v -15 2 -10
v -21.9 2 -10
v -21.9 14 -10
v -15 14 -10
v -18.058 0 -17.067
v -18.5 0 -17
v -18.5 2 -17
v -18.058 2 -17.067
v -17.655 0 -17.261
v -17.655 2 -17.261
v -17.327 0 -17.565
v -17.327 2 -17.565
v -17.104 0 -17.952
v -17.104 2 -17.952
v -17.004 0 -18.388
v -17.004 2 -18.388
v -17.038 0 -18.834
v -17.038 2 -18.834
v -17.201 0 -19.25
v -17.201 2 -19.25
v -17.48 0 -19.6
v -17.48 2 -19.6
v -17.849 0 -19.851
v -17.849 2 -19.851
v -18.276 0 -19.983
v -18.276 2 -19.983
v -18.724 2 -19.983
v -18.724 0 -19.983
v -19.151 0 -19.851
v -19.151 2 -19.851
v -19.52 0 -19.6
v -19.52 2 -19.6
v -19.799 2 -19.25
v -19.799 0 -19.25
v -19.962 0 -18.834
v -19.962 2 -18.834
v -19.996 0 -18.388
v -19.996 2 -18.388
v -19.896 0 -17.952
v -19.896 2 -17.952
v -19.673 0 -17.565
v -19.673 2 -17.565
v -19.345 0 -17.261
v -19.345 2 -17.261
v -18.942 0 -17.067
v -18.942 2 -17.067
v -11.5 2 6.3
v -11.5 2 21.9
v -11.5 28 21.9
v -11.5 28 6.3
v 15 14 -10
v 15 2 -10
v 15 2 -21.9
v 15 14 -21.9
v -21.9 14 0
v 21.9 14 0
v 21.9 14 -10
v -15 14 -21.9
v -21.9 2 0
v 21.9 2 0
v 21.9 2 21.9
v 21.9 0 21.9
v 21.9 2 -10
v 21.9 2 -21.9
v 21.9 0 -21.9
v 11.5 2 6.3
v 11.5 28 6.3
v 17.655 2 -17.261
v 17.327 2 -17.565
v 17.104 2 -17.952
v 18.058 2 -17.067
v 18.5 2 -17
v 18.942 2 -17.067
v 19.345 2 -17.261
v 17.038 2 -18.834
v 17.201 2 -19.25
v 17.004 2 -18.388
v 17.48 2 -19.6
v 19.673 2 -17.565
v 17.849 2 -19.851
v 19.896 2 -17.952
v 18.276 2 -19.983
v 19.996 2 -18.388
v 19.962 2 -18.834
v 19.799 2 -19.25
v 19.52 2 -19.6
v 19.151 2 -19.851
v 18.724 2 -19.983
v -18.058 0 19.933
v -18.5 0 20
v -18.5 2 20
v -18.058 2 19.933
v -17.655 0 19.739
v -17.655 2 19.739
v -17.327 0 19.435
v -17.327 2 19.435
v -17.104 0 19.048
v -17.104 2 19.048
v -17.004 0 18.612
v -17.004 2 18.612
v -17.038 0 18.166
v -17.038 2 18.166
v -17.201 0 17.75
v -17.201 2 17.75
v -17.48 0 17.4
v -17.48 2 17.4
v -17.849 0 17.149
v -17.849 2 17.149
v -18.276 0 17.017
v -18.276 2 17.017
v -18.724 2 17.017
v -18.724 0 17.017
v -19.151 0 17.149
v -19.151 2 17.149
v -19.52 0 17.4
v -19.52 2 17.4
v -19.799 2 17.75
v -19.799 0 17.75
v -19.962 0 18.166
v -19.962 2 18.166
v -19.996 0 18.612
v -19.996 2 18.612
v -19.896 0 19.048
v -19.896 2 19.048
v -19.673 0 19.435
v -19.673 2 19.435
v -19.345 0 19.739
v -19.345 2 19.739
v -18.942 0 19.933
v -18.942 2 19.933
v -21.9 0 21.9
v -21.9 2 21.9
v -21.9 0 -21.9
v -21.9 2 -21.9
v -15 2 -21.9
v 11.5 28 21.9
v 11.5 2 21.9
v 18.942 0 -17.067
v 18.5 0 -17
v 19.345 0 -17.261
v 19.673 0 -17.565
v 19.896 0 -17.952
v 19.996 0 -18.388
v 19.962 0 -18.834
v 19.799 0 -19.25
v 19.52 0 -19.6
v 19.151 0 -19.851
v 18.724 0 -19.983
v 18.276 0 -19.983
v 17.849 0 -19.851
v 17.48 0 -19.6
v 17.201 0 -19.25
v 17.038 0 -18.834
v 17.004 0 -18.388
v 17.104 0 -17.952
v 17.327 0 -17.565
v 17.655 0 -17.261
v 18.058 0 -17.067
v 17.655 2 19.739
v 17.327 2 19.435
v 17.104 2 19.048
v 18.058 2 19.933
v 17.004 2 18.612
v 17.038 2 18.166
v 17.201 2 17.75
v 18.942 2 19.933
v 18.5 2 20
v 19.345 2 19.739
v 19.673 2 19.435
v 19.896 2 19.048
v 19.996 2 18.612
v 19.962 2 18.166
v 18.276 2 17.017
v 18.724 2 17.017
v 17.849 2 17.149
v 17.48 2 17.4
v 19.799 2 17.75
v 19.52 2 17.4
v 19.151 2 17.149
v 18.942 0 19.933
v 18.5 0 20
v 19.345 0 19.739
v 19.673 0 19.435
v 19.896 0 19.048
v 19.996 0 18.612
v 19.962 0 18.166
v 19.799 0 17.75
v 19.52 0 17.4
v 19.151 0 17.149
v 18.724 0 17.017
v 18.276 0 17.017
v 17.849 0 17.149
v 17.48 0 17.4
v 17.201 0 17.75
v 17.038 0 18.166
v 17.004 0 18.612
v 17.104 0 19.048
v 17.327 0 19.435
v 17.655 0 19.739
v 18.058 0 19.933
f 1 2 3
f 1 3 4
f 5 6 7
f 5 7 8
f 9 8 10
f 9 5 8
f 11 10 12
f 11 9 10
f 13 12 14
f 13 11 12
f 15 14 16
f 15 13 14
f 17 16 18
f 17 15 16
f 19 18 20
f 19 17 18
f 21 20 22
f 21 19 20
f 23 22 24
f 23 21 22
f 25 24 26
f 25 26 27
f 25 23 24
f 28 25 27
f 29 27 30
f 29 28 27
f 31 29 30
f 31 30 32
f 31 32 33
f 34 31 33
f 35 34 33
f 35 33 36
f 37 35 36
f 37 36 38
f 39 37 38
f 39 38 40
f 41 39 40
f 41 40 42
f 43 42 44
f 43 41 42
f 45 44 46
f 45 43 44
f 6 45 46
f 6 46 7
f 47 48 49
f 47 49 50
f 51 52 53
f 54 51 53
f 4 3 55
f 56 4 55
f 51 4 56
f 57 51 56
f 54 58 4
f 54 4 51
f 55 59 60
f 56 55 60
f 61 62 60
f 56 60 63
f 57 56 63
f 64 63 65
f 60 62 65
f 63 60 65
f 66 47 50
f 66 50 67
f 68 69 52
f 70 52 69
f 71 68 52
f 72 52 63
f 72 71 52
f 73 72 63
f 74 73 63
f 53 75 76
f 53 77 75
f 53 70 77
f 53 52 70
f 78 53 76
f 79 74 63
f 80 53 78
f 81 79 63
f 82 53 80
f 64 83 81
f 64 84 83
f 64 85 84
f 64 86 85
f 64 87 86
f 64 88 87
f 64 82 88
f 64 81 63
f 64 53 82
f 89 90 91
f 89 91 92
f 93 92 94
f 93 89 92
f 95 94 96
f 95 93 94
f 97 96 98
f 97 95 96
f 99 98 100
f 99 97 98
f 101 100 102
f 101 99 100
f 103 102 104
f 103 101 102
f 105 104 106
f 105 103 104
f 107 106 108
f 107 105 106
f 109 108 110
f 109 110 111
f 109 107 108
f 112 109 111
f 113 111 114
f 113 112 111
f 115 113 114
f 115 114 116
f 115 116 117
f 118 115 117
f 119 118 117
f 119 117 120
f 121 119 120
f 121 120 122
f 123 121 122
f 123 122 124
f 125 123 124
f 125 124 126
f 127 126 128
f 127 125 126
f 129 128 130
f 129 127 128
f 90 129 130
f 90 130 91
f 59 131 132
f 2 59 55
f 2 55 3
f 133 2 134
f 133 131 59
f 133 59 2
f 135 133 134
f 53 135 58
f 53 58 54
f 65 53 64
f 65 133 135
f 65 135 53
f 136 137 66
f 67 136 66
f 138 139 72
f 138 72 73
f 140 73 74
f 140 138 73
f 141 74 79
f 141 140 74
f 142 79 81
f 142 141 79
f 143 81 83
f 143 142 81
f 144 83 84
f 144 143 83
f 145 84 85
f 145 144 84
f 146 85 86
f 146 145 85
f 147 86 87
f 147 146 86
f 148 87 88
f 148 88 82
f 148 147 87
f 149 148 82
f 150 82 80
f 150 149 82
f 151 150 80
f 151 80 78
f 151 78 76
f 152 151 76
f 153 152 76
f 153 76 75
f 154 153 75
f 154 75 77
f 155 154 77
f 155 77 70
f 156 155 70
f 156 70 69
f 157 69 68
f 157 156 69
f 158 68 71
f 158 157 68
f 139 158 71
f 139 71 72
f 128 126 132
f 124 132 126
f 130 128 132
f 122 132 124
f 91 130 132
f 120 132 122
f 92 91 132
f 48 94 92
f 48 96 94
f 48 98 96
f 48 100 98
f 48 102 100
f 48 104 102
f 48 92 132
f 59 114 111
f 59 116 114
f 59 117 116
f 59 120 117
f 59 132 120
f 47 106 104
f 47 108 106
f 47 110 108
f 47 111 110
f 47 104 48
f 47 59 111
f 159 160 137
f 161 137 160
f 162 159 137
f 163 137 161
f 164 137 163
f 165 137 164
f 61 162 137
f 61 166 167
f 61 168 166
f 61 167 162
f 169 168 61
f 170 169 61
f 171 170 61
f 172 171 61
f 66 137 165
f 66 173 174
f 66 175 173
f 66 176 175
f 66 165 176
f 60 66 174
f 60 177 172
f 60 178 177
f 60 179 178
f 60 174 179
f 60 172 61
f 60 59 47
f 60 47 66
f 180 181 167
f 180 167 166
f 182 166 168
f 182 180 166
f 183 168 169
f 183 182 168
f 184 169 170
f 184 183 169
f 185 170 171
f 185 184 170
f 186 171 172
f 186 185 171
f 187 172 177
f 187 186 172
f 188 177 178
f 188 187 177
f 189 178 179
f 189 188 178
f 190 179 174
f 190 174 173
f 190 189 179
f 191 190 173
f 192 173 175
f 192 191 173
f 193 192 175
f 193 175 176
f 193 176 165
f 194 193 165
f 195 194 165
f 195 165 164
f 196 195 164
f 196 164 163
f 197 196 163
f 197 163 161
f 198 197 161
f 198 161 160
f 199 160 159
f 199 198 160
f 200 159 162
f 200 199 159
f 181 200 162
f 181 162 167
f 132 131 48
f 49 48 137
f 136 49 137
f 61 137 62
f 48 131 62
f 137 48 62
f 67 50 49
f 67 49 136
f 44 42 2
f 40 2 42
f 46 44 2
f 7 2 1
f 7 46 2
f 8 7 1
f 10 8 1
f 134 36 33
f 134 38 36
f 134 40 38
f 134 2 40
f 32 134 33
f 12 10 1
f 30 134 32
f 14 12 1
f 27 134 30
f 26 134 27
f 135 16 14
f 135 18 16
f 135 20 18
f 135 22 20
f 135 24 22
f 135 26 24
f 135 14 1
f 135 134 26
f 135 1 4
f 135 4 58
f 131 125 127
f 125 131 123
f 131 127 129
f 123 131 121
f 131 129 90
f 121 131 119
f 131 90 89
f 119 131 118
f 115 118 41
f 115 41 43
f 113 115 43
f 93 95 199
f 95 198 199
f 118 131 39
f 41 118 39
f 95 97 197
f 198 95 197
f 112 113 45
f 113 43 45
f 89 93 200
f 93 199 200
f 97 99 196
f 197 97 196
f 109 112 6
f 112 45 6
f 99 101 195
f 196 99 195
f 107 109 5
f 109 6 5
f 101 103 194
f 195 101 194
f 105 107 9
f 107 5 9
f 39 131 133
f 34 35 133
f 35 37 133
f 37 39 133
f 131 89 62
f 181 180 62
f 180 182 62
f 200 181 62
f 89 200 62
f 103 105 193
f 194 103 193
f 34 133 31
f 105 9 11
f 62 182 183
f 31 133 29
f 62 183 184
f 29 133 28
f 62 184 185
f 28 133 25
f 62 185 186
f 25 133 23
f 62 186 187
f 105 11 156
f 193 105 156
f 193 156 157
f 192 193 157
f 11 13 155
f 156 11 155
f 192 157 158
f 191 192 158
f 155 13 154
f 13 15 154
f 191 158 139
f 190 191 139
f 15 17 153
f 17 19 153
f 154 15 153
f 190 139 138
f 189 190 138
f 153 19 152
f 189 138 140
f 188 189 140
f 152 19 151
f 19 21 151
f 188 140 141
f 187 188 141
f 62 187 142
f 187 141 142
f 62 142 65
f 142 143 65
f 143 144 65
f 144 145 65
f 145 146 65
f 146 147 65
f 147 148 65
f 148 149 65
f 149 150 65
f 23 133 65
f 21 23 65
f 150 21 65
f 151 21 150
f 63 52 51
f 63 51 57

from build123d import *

# Parameters (mm, degrees)
ESBO_O1_W                = 43.8
ESBO_O1_H                = 43.8
ESBO_O1_R                = 1.5
RESSALTO_EXTRUS_O1_DEPTH = 2
ESBO_O2_W                = 23
ESBO_O2_H                = 15.6
RESSALTO_EXTRUS_O2_DEPTH = 26
ESBO_O3_W                = 6.9
ESBO_O3_H                = 10
ESBO_O3_W_2              = 30
ESBO_O3_H_2              = 11.9
RESSALTO_EXTRUS_O3_DEPTH = 12


with BuildPart() as part:
    # Esboço1 → Ressalto-extrusão1 (new body)
    with BuildSketch(Plane(origin=(0, 0, 0), x_dir=(1, 0, 0), z_dir=(0, 1, 0))):
        Rectangle(ESBO_O1_W, ESBO_O1_H)
        with Locations(Location((18.5, 18.5, 0), (0, 0, 270))):
            Circle(ESBO_O1_R, mode=Mode.SUBTRACT)
        with Locations(Location((-18.5, 18.5, 0), (0, 0, 270))):
            Circle(ESBO_O1_R, mode=Mode.SUBTRACT)
        with Locations(Location((18.5, -18.5, 0), (0, 0, 270))):
            Circle(ESBO_O1_R, mode=Mode.SUBTRACT)
        with Locations(Location((-18.5, -18.5, 0), (0, 0, 270))):
            Circle(ESBO_O1_R, mode=Mode.SUBTRACT)
    extrude(amount=RESSALTO_EXTRUS_O1_DEPTH)

    # Esboço2 → Ressalto-extrusão2 (add)
    with BuildSketch(Plane(origin=(0, 2, 0), x_dir=(1, 0, 0), z_dir=(0, 1, 0))):
        with Locations((0, -14.1)):
            Rectangle(ESBO_O2_W, ESBO_O2_H)
    extrude(amount=RESSALTO_EXTRUS_O2_DEPTH)

    # Esboço3 → Ressalto-extrusão3 (add)
    with BuildSketch(Plane(origin=(0, 2, 0), x_dir=(1, 0, 0), z_dir=(0, 1, 0))):
        with Locations((-18.45, 5)):
            Rectangle(ESBO_O3_W, ESBO_O3_H)
        with Locations((18.45, 5)):
            Rectangle(ESBO_O3_W, ESBO_O3_H)
        with Locations((0, 15.95)):
            Rectangle(ESBO_O3_W_2, ESBO_O3_H_2)
        with Locations((0, 5)):
            Rectangle(ESBO_O3_W_2, ESBO_O3_H)
    extrude(amount=RESSALTO_EXTRUS_O3_DEPTH)


solid = part.part
